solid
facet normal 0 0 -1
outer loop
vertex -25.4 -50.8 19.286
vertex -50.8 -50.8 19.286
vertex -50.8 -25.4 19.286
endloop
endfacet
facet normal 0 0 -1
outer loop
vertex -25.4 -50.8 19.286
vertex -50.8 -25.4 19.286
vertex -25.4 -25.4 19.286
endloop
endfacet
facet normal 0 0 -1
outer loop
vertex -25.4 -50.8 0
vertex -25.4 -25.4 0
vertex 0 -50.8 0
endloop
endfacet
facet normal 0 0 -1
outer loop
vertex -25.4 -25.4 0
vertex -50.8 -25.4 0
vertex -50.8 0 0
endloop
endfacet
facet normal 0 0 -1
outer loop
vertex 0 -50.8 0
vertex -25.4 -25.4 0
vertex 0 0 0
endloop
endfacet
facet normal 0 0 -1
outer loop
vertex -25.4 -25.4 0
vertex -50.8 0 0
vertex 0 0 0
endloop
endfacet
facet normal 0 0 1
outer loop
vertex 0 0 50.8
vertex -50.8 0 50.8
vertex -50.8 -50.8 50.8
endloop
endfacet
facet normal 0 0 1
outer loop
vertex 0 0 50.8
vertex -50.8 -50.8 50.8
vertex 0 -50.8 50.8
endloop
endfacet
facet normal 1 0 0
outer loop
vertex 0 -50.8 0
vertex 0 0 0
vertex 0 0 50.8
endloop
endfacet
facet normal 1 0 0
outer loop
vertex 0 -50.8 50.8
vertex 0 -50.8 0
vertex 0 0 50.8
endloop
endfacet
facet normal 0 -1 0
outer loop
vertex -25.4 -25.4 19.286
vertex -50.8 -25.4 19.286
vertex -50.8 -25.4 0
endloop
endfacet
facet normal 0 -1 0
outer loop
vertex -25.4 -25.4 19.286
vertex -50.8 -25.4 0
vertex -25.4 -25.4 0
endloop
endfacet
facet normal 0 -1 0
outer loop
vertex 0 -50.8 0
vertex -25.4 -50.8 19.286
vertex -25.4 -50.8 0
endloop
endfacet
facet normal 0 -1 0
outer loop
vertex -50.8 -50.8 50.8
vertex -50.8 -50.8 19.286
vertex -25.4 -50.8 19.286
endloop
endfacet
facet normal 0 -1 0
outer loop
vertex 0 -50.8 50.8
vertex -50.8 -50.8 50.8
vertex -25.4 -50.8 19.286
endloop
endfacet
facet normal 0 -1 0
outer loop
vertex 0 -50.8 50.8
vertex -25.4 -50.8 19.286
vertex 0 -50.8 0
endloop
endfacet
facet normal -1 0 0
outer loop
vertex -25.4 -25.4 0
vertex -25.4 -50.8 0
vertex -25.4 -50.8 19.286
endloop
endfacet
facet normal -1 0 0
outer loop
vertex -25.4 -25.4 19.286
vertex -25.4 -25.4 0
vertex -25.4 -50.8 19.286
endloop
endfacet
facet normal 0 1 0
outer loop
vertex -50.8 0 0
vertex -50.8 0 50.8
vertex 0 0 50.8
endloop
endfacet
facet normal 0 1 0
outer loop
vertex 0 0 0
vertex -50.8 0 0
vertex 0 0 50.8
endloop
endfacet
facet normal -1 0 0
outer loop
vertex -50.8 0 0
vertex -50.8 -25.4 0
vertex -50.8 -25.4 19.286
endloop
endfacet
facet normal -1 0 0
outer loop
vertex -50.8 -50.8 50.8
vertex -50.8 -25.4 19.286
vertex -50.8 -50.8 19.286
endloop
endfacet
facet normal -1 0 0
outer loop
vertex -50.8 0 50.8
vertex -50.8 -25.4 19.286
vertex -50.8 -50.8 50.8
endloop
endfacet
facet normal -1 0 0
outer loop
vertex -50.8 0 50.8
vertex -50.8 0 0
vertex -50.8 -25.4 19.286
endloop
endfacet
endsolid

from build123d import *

# Parameters (mm, degrees)
F0_W     = 50.8
F0_H     = 50.8
F1_DEPTH = 50.8
F2_W     = 25.4
F2_H     = 25.4
F3_DEPTH = 25.4
F4_W     = 25.4
F4_H     = 25.4
F5_DEPTH = 25.4
F6_W     = 25.4
F6_H     = 19.28642
F7_DEPTH = 25.4


with BuildPart() as f1:
    # F0 (on Front) → F1 (new body)
    with BuildSketch(Plane.XZ):
        with Locations((-25.4, 25.4)):
            Rectangle(F0_W, F0_H)
    extrude(amount=F1_DEPTH)

    # F2 (on Front) → F3 (cut)
    with BuildSketch(Plane.XZ):
        with Locations((-37.521074, 12.7)):
            Rectangle(F2_W, F2_H)
    extrude(amount=-F3_DEPTH, mode=Mode.SUBTRACT)

    # F4 (on Front) → F5 (cut)
    with BuildSketch(Plane.XZ):
        with Locations((-37.33012, 12.7)):
            Rectangle(F4_W, F4_H)
    extrude(amount=-F5_DEPTH, mode=Mode.SUBTRACT)

    # F6 (on face) → F7 (cut)
    with BuildSketch(Plane.XZ.offset(50.8)):
        with Locations((-38.1, 9.64321)):
            Rectangle(F6_W, F6_H)
    extrude(amount=-F7_DEPTH, mode=Mode.SUBTRACT)


solid = f1.part
